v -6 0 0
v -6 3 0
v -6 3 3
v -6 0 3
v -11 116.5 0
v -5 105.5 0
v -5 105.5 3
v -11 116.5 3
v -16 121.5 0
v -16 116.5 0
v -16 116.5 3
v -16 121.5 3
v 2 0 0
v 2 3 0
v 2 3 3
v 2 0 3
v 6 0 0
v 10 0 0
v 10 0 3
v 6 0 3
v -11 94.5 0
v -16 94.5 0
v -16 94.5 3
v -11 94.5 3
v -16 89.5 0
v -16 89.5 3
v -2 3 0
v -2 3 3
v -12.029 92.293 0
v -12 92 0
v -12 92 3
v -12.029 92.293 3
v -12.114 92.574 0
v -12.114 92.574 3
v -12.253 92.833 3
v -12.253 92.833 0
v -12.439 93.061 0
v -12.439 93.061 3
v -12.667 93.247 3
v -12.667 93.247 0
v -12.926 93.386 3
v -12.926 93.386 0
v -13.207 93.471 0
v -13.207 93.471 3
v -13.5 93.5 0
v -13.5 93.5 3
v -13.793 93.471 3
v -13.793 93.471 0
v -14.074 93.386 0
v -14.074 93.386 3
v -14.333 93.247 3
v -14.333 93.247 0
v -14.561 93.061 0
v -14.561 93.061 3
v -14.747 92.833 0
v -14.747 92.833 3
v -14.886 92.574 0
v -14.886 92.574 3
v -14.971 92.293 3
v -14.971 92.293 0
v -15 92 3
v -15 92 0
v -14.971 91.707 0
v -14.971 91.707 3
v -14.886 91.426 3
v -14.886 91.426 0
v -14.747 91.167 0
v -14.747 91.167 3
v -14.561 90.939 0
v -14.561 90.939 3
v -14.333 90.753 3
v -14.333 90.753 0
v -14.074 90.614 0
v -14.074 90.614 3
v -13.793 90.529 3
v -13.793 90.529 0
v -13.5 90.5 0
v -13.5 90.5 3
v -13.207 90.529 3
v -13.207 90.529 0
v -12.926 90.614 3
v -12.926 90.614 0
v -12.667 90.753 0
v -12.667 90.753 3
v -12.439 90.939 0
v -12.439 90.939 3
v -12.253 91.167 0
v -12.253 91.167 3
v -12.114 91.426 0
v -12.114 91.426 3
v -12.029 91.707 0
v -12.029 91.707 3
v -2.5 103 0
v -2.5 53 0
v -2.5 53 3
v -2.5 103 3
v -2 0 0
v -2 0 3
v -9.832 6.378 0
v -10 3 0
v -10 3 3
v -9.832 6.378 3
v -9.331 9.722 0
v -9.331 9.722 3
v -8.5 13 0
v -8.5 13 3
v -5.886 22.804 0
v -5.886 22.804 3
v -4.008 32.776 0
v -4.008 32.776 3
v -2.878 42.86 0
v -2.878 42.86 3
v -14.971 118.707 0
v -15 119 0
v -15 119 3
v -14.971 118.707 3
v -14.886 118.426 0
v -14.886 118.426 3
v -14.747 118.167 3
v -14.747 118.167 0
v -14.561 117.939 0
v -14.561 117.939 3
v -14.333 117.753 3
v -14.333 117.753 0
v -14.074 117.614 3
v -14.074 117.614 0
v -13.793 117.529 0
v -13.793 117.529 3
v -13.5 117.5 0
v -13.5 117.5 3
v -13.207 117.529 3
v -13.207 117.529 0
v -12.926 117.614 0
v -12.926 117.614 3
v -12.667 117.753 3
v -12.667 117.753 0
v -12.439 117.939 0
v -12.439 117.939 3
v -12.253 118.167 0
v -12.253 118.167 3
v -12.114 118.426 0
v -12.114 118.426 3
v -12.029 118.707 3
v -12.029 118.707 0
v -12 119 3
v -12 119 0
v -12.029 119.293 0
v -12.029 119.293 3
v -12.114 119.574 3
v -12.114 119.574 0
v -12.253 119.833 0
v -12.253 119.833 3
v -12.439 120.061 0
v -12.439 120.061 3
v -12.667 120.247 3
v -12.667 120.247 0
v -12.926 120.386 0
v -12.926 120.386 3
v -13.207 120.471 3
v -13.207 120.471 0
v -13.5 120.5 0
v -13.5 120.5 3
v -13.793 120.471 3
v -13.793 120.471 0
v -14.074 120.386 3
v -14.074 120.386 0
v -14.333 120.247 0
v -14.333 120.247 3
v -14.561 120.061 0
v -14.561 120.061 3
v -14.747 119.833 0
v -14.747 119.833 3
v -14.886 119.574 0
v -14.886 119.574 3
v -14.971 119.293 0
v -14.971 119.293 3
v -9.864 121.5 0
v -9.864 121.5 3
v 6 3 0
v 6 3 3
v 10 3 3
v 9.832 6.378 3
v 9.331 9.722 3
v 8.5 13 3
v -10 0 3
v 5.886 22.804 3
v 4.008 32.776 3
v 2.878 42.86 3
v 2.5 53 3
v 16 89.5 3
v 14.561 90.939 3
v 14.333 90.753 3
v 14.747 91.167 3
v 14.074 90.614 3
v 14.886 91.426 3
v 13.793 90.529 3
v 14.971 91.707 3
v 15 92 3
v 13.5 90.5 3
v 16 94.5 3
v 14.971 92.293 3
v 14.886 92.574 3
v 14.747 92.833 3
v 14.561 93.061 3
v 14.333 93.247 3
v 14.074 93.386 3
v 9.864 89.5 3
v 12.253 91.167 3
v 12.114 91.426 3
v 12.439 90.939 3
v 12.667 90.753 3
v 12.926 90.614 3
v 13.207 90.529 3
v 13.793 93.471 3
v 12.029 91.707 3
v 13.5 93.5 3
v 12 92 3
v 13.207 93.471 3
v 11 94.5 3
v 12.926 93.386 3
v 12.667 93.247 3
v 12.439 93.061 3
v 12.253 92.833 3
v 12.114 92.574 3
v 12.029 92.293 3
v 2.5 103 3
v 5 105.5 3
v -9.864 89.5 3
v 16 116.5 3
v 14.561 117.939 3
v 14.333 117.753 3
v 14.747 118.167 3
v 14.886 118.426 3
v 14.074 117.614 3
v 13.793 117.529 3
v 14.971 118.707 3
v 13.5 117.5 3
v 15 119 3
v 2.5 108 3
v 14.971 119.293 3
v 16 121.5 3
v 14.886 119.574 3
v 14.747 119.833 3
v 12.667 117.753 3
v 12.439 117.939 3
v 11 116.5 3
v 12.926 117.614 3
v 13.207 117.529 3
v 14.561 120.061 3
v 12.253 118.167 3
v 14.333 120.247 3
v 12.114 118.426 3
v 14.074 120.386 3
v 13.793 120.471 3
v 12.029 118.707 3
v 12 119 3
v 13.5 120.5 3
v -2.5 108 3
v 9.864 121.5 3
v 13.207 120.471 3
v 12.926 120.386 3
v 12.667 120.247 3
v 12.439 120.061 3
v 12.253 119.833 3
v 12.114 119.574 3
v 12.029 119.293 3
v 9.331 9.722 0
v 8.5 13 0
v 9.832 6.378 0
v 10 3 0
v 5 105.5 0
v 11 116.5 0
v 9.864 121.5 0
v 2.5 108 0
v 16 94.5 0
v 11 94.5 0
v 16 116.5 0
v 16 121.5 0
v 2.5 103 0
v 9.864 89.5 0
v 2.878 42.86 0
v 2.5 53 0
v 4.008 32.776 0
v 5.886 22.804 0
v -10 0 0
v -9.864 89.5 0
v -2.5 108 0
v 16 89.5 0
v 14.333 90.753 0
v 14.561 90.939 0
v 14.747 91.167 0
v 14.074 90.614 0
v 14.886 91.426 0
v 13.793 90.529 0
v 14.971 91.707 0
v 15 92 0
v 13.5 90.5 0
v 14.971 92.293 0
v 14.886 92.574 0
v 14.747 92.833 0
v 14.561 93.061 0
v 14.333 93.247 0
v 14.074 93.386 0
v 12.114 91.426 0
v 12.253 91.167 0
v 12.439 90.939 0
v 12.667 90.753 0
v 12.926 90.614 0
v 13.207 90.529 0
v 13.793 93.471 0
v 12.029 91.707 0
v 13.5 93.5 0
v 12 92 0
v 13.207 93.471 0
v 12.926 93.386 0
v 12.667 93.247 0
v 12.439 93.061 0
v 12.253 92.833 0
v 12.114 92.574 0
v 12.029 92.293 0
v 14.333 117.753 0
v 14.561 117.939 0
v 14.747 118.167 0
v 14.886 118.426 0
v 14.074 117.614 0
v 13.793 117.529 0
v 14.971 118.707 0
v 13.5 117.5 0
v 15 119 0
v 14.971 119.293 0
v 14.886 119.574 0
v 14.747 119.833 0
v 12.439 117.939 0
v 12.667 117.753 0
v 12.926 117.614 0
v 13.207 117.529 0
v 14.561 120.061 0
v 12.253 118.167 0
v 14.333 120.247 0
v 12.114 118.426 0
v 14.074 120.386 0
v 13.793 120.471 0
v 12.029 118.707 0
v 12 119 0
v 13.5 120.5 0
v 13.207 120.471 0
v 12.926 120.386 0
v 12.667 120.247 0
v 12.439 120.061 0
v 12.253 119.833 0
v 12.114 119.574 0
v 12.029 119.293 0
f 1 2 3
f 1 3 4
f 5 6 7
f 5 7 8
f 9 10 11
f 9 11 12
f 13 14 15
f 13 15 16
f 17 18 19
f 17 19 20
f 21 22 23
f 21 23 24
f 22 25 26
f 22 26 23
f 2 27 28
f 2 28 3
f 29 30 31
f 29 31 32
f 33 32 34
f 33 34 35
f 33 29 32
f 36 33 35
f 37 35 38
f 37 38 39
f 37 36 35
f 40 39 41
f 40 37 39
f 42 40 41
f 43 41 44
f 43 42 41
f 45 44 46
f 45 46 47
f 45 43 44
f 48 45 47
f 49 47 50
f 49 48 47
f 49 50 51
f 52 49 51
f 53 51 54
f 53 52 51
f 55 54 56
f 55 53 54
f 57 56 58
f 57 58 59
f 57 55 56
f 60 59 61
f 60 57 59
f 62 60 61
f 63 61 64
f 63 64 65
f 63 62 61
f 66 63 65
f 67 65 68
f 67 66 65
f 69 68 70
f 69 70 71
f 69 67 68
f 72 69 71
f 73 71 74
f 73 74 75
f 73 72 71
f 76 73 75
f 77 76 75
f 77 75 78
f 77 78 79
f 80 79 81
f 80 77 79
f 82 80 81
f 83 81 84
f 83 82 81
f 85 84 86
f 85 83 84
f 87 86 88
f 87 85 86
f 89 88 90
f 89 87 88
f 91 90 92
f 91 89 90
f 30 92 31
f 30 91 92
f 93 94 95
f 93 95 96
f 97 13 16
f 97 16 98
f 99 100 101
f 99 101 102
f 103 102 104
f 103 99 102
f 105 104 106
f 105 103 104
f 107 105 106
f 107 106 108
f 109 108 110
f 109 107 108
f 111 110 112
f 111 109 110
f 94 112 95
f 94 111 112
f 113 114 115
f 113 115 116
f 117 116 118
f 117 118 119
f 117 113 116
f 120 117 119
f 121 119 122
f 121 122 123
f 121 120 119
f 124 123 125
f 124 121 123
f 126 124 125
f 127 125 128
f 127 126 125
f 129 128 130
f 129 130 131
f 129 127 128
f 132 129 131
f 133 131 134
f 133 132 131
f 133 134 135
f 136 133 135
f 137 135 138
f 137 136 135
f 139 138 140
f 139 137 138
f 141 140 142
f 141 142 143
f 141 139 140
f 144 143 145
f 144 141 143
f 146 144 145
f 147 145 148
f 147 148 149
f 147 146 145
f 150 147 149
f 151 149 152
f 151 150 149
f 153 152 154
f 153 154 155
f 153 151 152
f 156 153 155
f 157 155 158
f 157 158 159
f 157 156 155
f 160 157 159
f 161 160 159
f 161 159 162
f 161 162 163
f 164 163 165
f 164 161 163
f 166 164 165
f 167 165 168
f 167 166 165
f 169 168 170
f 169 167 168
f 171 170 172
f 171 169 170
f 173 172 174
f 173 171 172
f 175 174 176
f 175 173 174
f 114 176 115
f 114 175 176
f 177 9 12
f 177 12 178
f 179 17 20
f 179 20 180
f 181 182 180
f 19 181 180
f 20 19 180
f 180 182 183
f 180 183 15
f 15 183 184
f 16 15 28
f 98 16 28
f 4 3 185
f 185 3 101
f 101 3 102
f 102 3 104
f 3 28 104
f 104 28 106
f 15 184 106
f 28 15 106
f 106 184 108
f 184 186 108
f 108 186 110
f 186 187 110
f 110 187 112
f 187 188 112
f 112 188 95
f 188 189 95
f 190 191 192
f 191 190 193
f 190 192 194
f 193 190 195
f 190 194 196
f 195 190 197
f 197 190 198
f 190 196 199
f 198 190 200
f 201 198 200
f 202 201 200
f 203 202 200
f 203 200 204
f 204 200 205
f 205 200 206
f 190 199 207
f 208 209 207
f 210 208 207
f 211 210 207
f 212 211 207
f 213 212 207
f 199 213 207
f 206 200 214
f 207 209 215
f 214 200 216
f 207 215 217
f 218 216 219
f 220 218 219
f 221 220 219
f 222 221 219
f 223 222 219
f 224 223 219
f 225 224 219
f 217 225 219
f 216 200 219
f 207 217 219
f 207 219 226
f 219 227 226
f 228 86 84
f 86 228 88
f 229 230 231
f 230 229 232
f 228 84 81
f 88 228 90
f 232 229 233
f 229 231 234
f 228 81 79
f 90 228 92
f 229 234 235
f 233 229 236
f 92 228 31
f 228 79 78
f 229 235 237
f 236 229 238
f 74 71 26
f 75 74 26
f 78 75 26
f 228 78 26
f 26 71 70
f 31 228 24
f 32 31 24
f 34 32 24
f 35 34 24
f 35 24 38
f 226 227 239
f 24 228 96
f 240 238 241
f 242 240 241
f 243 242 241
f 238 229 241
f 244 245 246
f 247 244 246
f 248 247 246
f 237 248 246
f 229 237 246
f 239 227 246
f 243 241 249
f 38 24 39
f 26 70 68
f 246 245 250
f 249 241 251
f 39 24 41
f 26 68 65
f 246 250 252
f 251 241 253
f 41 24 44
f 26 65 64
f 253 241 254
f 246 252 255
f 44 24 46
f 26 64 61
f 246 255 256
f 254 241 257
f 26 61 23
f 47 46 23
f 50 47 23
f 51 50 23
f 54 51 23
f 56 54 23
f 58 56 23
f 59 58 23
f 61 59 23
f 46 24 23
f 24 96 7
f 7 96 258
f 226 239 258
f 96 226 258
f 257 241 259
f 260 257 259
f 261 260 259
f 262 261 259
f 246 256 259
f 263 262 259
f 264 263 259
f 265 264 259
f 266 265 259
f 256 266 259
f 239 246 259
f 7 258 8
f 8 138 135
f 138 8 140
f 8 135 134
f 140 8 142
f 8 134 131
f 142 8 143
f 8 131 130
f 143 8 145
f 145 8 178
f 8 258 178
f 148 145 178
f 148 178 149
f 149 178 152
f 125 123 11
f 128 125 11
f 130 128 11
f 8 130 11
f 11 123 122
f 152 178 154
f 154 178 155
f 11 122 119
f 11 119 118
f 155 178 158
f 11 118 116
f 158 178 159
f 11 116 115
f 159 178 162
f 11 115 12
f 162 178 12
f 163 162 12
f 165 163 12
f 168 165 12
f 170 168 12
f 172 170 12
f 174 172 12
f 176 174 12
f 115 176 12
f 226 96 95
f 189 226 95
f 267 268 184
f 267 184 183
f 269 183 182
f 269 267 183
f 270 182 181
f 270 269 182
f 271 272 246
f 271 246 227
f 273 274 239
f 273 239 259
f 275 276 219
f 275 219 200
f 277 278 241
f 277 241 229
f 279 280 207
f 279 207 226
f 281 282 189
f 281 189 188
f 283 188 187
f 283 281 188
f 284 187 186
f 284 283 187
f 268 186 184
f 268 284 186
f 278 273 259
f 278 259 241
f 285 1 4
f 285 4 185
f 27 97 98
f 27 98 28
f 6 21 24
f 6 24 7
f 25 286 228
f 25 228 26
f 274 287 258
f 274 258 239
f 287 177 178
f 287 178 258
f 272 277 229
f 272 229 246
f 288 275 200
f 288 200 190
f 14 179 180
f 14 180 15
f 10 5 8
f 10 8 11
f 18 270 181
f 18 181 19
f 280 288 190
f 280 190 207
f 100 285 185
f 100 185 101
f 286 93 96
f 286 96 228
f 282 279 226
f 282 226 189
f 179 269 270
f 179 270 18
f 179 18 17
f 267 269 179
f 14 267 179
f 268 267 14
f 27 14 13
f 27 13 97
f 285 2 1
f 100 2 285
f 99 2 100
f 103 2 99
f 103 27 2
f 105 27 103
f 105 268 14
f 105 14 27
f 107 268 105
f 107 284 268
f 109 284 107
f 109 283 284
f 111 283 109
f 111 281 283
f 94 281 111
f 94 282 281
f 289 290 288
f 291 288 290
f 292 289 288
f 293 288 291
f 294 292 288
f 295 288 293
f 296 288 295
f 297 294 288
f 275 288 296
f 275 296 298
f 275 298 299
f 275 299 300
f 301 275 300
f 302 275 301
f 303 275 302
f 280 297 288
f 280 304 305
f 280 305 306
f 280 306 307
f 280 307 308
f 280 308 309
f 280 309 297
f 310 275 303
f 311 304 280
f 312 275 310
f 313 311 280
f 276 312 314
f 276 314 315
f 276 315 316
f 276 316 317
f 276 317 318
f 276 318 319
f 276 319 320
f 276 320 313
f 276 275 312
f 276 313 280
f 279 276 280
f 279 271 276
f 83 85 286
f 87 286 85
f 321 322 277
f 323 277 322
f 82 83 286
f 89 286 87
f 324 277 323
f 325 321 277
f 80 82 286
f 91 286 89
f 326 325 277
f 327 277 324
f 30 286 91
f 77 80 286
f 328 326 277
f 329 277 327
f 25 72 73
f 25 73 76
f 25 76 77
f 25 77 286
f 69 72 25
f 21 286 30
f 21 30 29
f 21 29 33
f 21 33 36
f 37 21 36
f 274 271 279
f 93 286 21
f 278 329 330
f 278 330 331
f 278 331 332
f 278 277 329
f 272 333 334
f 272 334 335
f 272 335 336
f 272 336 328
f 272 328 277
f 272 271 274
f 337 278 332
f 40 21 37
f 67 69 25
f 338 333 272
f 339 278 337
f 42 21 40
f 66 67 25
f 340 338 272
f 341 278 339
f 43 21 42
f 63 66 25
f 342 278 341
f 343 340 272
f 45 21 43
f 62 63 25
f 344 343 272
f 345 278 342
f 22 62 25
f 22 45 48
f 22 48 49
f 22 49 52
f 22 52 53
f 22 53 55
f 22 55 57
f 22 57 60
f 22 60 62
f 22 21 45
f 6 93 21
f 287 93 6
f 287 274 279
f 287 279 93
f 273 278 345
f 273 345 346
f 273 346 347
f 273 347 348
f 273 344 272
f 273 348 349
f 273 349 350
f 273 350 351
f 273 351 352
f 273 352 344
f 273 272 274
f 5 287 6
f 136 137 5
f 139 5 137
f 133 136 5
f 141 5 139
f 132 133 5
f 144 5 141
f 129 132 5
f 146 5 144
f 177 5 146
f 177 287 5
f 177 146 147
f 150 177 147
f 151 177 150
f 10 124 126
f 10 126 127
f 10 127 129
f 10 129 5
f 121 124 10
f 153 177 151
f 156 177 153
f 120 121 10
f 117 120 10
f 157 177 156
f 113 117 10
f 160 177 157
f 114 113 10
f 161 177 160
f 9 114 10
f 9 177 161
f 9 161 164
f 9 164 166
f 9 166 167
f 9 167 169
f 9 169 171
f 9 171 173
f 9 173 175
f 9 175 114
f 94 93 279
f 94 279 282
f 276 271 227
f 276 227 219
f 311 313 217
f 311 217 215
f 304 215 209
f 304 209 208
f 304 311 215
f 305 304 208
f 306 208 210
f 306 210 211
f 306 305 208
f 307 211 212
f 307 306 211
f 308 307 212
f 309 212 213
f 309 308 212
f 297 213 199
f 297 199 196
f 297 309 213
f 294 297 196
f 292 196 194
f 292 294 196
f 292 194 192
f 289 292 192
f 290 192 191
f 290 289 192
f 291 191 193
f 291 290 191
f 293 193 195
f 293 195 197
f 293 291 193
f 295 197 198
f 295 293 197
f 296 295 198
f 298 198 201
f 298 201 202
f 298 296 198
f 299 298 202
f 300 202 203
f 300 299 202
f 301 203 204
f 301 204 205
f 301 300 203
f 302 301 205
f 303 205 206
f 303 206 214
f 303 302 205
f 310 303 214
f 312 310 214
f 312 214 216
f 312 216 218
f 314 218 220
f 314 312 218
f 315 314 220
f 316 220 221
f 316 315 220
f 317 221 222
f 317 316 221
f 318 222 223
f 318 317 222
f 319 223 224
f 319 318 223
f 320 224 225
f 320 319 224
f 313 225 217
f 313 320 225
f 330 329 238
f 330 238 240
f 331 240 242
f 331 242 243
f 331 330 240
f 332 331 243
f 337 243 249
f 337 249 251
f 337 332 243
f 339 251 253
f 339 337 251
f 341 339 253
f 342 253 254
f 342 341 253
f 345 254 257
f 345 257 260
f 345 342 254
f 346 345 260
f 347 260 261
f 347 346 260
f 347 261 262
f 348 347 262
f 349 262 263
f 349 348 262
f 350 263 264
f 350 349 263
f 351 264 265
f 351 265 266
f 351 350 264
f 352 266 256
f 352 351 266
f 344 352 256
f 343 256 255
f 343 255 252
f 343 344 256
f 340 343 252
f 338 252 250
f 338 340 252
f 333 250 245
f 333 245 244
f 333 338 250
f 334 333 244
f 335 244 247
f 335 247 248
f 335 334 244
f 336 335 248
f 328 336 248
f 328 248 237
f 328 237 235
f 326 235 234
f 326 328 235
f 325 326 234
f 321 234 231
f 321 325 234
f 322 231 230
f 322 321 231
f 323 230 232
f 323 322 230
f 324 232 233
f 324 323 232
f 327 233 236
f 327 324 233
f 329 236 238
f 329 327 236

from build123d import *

# Parameters (mm, degrees)
SKETCH1_R           = 1.5
BOSS_EXTRUDE1_DEPTH = 3


with BuildPart() as part:
    # Sketch1 → Boss-Extrude1 (new body)
    with BuildSketch(Plane.XY):
        with BuildLine():
            Line((-10, 0), (-10, 3))
            ThreePointArc((-10, 3), (-9.622914027, 8.055937104), (-8.5, 13))
            ThreePointArc((-8.5, 13), (-4.008343892, 32.776251584), (-2.5, 53))
            Line((-2.5, 53), (-2.5, 103))
            Line((-2.5, 103), (-9.863636364, 89.5))
            Line((-9.863636364, 89.5), (-16, 89.5))
            Line((-16, 89.5), (-16, 94.5))
            Line((-16, 94.5), (-11, 94.5))
            Line((-11, 94.5), (-5, 105.5))
            Line((-5, 105.5), (-11, 116.5))
            Line((-11, 116.5), (-16, 116.5))
            Line((-16, 116.5), (-16, 121.5))
            Line((-16, 121.5), (-9.863636364, 121.5))
            Line((-9.863636364, 121.5), (-2.5, 108))
            Line((-2.5, 108), (2.5, 108))
            Line((2.5, 108), (9.863636364, 121.5))
            Line((9.863636364, 121.5), (16, 121.5))
            Line((16, 121.5), (16, 116.5))
            Line((16, 116.5), (11, 116.5))
            Line((11, 116.5), (5, 105.5))
            Line((5, 105.5), (11, 94.5))
            Line((11, 94.5), (16, 94.5))
            Line((16, 94.5), (16, 89.5))
            Line((16, 89.5), (9.863636364, 89.5))
            Line((9.863636364, 89.5), (2.5, 103))
            Line((2.5, 103), (2.5, 53))
            ThreePointArc((2.5, 53), (4.008343892, 32.776251584), (8.5, 13))
            ThreePointArc((8.5, 13), (9.622914027, 8.055937104), (10, 3))
            Line((10, 3), (10, 0))
            Line((10, 0), (6, 0))
            Line((6, 0), (6, 3))
            Line((6, 3), (2, 3))
            Line((2, 3), (2, 0))
            Line((2, 0), (-2, 0))
            Line((-2, 0), (-2, 3))
            Line((-2, 3), (-6, 3))
            Line((-6, 3), (-6, 0))
            Line((-6, 0), (-10, 0))
        make_face()
        with Locations((-13.5, 92)):
            Circle(SKETCH1_R, mode=Mode.SUBTRACT)
        with Locations(Location((13.5, 92, 0), (0, 0, 180))):
            Circle(SKETCH1_R, mode=Mode.SUBTRACT)
        with Locations((13.5, 119)):
            Circle(SKETCH1_R, mode=Mode.SUBTRACT)
        with Locations(Location((-13.5, 119, 0), (0, 0, 180))):
            Circle(SKETCH1_R, mode=Mode.SUBTRACT)
    extrude(amount=BOSS_EXTRUDE1_DEPTH)


solid = part.part
